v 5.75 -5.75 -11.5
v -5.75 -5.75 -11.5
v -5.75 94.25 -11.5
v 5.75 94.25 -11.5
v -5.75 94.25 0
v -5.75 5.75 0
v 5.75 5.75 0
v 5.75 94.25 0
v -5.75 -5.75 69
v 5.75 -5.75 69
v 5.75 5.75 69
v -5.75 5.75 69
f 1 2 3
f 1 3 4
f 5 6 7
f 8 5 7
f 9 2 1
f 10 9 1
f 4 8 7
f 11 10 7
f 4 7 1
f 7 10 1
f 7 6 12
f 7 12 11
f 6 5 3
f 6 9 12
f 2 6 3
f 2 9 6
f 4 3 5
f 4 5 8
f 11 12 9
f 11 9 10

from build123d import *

# Parameters (mm, degrees)
SKETCH1_W           = 11.5
SKETCH1_H           = 11.5
BOSS_EXTRUDE1_DEPTH = 69
BOSS_EXTRUDE2_START = -5.75
SKETCH3_W           = 11.5
SKETCH3_H           = 11.5
BOSS_EXTRUDE2_DEPTH = 100


with BuildPart() as part:
    # Sketch1 → Boss-Extrude1 (new body)
    with BuildSketch(Plane.XY):
        Rectangle(SKETCH1_W, SKETCH1_H)
    extrude(amount=BOSS_EXTRUDE1_DEPTH)

    # Sketch3 → Boss-Extrude2 (add)
    with BuildSketch(Plane(origin=(0, 0, 0), x_dir=(1, 0, 0), z_dir=(0, 1, 0)).offset(BOSS_EXTRUDE2_START)):
        with Locations((0, 5.75)):
            Rectangle(SKETCH3_W, SKETCH3_H)
    extrude(amount=BOSS_EXTRUDE2_DEPTH)


solid = part.part
